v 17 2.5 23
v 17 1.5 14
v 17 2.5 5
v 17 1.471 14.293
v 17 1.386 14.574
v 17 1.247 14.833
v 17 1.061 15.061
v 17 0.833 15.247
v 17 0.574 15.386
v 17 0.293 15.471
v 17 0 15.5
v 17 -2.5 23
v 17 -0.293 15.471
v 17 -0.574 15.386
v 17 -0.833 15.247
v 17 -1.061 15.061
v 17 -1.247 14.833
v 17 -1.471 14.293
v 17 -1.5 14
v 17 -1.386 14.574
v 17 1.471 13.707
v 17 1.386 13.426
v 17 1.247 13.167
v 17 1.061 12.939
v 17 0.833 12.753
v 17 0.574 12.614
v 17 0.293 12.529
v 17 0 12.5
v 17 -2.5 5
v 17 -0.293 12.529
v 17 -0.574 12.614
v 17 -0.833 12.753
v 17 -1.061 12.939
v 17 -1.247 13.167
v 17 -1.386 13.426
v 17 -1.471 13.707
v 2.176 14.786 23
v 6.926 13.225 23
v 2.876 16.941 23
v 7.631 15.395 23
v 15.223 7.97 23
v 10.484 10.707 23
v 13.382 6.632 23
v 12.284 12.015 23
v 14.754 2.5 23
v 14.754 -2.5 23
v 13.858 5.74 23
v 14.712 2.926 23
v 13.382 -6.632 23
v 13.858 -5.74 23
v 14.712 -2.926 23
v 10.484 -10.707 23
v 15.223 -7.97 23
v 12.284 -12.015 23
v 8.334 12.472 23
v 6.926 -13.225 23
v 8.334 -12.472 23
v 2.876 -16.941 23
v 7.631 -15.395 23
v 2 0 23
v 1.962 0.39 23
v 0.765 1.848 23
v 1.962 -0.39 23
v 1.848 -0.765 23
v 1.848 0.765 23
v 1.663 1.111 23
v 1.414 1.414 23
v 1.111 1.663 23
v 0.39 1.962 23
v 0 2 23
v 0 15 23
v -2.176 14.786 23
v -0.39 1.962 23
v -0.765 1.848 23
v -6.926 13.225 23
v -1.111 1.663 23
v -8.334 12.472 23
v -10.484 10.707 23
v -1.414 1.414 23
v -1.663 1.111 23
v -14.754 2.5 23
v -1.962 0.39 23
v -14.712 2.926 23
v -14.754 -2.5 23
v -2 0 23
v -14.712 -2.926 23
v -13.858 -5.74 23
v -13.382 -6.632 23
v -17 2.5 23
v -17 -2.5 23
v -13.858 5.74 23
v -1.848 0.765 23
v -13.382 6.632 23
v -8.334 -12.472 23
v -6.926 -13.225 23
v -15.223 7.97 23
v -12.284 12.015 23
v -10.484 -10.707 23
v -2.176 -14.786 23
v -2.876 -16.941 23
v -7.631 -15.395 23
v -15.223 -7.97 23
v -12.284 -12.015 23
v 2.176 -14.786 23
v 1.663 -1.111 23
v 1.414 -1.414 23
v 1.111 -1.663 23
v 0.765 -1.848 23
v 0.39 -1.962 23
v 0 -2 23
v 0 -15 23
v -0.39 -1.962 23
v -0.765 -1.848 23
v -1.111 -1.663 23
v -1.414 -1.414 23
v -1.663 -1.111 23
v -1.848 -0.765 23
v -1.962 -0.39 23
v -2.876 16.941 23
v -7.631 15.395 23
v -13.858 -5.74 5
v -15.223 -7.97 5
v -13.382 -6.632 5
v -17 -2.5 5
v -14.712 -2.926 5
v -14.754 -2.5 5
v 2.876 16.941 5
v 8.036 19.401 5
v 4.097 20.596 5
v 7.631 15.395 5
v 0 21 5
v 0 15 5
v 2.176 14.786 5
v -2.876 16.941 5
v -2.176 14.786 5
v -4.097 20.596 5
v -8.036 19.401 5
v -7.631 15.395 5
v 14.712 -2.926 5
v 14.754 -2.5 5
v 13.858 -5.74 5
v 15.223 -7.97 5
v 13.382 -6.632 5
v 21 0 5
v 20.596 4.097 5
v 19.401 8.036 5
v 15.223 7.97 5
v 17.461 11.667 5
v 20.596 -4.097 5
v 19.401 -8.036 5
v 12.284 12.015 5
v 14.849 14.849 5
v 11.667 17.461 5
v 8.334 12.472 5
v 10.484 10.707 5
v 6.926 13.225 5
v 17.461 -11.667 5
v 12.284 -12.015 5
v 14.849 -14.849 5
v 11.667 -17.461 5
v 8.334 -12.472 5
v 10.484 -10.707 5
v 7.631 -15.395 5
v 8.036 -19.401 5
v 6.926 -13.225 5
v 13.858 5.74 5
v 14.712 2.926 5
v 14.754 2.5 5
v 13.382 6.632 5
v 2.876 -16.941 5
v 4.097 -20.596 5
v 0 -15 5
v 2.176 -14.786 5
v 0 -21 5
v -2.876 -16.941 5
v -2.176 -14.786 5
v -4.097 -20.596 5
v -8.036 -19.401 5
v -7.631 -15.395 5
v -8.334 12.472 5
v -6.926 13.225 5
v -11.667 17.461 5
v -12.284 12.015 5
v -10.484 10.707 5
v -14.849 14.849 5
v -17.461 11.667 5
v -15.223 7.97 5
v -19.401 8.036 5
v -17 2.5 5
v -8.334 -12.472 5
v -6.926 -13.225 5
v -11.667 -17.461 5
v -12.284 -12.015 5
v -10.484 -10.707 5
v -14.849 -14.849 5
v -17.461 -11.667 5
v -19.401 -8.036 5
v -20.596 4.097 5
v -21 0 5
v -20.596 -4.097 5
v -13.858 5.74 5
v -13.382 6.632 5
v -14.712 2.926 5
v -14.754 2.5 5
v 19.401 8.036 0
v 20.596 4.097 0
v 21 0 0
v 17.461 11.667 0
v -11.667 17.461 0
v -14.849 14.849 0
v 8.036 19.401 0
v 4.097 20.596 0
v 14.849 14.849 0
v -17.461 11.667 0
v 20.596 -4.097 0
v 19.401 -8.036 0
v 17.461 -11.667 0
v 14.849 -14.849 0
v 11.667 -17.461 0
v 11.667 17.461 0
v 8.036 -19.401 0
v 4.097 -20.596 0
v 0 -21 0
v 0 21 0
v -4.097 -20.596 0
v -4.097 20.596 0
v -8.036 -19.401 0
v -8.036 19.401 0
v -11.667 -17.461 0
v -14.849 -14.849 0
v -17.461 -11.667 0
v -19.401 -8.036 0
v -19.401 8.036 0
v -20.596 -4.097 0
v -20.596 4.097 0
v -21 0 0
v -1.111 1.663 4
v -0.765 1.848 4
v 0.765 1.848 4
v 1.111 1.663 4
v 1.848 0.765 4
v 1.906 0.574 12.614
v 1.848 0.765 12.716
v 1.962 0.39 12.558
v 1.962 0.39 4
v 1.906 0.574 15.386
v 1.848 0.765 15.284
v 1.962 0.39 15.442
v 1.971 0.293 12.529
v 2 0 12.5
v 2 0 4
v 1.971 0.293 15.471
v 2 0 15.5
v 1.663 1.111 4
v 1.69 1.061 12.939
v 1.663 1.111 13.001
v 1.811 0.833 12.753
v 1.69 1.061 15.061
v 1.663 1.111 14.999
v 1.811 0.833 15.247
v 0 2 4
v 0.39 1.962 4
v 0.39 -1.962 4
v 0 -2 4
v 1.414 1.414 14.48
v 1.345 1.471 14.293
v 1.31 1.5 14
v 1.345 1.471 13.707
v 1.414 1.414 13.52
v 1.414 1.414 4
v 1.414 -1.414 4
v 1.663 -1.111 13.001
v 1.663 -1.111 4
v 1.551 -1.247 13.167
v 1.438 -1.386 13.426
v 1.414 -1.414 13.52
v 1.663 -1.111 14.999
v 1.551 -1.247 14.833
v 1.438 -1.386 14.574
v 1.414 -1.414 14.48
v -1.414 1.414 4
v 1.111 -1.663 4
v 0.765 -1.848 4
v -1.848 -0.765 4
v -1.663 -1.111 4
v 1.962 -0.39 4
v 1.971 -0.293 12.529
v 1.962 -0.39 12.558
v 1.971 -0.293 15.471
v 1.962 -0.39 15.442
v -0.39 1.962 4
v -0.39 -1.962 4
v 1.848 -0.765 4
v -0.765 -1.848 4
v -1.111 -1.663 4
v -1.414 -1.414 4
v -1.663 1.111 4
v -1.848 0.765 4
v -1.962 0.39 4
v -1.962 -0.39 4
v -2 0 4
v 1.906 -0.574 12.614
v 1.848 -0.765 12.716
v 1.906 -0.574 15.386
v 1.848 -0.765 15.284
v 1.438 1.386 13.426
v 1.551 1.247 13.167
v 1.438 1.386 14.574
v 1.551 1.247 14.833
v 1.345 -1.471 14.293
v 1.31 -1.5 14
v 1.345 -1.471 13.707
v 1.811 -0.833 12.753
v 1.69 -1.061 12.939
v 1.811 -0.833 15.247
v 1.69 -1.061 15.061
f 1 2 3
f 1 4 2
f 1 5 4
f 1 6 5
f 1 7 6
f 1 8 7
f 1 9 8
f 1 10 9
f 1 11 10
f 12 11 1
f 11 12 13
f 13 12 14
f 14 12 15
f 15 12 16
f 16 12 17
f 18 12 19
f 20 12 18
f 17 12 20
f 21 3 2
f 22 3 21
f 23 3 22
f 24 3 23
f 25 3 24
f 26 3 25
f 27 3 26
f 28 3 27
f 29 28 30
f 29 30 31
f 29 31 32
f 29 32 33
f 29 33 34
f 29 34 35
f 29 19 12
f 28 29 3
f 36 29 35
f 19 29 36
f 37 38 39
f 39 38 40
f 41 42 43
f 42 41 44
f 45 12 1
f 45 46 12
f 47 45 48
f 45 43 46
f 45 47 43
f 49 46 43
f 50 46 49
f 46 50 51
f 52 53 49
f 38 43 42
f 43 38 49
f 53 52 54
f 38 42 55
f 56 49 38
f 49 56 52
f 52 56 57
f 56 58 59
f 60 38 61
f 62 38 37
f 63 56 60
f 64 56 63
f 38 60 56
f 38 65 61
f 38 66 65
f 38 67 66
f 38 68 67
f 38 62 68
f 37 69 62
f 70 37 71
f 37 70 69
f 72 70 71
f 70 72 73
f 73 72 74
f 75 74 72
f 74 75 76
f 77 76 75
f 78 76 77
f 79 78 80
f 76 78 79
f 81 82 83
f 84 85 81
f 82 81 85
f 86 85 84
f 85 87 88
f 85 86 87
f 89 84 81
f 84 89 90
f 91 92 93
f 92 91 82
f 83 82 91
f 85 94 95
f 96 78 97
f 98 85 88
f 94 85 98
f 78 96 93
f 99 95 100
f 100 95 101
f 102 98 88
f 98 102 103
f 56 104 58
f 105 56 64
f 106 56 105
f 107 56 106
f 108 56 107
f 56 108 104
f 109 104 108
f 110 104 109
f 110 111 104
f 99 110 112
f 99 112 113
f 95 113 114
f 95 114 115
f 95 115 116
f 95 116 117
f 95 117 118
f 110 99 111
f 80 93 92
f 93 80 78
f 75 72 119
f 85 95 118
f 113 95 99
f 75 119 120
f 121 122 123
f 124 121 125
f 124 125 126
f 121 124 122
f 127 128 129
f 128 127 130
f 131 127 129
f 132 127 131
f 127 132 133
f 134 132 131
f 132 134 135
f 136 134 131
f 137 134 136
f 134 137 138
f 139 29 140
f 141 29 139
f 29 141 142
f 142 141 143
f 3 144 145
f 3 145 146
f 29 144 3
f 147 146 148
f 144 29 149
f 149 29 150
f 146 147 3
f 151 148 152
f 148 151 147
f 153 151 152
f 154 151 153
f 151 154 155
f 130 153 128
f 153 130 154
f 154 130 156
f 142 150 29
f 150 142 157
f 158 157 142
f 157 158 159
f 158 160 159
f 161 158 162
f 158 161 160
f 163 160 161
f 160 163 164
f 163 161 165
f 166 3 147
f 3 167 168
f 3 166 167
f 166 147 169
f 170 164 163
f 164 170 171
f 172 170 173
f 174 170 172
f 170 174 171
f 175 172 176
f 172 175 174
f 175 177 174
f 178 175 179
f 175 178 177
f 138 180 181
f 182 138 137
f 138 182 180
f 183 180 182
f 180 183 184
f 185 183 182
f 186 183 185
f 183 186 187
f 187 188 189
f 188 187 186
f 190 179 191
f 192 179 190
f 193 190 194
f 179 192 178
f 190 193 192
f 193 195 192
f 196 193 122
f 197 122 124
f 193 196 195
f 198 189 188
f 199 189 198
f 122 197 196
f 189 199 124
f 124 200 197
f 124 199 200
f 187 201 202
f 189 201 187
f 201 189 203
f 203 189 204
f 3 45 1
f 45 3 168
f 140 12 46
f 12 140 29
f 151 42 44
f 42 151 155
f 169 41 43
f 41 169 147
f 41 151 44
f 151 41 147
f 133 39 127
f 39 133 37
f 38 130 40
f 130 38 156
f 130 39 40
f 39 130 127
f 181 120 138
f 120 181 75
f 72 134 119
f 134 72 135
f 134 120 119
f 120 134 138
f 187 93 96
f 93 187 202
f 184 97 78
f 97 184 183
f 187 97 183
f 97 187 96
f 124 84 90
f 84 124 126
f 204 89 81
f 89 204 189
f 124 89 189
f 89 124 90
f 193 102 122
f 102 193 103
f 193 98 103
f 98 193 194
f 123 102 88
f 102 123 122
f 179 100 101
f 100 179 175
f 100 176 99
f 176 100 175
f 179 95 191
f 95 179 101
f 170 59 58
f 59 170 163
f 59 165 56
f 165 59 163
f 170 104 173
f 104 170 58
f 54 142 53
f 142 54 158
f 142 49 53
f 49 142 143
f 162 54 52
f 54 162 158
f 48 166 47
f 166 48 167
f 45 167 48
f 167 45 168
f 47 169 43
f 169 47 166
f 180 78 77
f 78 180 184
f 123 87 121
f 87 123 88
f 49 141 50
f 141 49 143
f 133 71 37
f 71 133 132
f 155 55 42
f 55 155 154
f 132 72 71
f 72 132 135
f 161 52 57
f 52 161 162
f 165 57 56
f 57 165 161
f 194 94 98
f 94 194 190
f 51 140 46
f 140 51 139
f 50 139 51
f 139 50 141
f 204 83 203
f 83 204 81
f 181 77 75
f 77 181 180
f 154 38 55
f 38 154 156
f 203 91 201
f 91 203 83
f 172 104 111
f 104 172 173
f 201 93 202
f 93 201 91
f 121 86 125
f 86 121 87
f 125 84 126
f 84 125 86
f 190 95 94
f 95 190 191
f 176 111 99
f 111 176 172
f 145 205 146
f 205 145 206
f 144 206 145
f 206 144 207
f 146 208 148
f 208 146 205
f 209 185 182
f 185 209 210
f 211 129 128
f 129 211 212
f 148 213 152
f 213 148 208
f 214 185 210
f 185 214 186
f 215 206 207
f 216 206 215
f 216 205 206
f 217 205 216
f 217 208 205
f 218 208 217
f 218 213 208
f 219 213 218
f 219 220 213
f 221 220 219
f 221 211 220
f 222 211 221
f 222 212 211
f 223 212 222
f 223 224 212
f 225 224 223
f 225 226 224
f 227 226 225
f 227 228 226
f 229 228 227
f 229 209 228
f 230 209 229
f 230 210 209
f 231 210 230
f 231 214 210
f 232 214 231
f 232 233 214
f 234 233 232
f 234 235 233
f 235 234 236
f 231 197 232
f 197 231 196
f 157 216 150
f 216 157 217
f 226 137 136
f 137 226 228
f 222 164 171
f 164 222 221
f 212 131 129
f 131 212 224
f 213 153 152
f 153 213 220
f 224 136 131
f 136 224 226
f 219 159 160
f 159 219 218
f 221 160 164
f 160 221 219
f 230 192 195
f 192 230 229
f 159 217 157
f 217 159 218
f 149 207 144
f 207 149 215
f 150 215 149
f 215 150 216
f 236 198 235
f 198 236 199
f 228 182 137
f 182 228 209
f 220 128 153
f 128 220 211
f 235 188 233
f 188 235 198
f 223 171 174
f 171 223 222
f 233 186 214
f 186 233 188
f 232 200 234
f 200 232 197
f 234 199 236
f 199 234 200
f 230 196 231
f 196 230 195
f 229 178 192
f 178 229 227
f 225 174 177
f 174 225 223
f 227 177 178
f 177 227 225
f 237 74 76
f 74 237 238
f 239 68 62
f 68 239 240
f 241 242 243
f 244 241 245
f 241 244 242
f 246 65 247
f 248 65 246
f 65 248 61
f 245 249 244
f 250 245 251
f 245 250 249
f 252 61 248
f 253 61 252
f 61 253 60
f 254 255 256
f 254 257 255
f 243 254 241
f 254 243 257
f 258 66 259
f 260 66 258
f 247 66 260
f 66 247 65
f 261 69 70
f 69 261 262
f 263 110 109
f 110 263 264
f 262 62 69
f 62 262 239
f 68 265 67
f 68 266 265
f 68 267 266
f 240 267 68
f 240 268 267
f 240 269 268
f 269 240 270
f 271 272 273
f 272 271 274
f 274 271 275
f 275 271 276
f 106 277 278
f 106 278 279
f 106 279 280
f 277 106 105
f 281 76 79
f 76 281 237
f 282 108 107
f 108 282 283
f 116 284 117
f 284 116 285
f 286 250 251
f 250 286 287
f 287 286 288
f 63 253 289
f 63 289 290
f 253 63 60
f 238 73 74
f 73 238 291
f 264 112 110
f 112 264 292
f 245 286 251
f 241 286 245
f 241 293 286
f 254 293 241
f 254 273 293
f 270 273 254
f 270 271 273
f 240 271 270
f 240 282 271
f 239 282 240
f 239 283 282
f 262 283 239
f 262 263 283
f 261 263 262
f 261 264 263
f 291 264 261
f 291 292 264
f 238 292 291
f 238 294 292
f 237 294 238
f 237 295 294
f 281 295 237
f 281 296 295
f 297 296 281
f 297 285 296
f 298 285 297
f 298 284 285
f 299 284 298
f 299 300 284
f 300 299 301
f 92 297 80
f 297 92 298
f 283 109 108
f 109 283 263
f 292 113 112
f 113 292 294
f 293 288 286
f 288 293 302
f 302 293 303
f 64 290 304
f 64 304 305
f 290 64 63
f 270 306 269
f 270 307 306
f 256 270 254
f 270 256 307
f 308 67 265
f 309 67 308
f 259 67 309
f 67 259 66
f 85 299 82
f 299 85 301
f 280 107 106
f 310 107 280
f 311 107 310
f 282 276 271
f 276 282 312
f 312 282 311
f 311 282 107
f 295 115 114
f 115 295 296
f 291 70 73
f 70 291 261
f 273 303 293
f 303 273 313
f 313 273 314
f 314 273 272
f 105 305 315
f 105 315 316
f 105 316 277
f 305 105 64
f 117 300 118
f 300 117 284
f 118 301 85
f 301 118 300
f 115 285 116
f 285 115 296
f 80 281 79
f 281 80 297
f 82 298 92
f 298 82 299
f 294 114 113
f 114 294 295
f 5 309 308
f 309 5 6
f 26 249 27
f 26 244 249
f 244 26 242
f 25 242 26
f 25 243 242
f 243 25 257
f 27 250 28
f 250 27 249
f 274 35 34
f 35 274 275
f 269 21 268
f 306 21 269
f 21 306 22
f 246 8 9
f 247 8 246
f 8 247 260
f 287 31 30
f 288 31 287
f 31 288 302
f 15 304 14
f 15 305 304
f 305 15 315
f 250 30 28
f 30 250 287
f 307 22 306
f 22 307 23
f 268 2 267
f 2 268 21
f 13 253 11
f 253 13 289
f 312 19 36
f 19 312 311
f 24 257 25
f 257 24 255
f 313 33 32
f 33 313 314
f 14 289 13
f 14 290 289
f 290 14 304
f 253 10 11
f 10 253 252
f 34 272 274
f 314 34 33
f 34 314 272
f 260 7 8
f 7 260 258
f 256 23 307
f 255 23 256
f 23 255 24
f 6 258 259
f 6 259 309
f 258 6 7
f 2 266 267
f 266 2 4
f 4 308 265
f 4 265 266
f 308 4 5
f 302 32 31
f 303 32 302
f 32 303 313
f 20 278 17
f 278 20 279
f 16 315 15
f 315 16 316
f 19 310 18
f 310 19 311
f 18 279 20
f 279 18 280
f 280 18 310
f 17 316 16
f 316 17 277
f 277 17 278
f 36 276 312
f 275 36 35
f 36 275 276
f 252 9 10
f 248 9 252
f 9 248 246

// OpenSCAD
$fn = 32;

// ----------------------------------------------------------------------
// Control knob: skirt knob with grip ribs
// ----------------------------------------------------------------------

// --- parameters (mm) ---
skirt_d = 42;             // skirt diameter
skirt_t = 5;              // skirt thickness
rib_w = 5;                // grip rib width
rib_out = 3;              // grip rib radial protrusion
n_ribs = 10;              // number of grip ribs
knob_d = 30;              // knob body diameter
knob_h = 18;              // knob body height
bore_d = 4;               // shaft bore diameter
set_d = 3;                // set screw bore diameter
fit_tol = 0.1;            // tolerance for press fits, mm
free_tol = 0.3;           // tolerance for clearance fits, mm

rib_step = 360 / n_ribs;  // rib angular step
total_h = skirt_t + knob_h;  // overall height

difference() {
  union() {
    translate([0, 0, skirt_t]) cylinder(h = knob_h, d = knob_d);
    cylinder(h = skirt_t, d = skirt_d);
    for (i = [0 : n_ribs - 1])
      rotate([0, 0, i * rib_step])
        translate([knob_d / 2 - 1, -rib_w / 2, skirt_t])
          cube([rib_out, rib_w, knob_h]);
  }
  translate([0, 0, skirt_t - 1]) cylinder(h = knob_h + 2, d = bore_d);
  translate([-1, 0, skirt_t + knob_h / 2]) rotate([0, 90, 0])
    cylinder(h = knob_d / 2 + bore_d / 2 + 2, d = set_d);
}
